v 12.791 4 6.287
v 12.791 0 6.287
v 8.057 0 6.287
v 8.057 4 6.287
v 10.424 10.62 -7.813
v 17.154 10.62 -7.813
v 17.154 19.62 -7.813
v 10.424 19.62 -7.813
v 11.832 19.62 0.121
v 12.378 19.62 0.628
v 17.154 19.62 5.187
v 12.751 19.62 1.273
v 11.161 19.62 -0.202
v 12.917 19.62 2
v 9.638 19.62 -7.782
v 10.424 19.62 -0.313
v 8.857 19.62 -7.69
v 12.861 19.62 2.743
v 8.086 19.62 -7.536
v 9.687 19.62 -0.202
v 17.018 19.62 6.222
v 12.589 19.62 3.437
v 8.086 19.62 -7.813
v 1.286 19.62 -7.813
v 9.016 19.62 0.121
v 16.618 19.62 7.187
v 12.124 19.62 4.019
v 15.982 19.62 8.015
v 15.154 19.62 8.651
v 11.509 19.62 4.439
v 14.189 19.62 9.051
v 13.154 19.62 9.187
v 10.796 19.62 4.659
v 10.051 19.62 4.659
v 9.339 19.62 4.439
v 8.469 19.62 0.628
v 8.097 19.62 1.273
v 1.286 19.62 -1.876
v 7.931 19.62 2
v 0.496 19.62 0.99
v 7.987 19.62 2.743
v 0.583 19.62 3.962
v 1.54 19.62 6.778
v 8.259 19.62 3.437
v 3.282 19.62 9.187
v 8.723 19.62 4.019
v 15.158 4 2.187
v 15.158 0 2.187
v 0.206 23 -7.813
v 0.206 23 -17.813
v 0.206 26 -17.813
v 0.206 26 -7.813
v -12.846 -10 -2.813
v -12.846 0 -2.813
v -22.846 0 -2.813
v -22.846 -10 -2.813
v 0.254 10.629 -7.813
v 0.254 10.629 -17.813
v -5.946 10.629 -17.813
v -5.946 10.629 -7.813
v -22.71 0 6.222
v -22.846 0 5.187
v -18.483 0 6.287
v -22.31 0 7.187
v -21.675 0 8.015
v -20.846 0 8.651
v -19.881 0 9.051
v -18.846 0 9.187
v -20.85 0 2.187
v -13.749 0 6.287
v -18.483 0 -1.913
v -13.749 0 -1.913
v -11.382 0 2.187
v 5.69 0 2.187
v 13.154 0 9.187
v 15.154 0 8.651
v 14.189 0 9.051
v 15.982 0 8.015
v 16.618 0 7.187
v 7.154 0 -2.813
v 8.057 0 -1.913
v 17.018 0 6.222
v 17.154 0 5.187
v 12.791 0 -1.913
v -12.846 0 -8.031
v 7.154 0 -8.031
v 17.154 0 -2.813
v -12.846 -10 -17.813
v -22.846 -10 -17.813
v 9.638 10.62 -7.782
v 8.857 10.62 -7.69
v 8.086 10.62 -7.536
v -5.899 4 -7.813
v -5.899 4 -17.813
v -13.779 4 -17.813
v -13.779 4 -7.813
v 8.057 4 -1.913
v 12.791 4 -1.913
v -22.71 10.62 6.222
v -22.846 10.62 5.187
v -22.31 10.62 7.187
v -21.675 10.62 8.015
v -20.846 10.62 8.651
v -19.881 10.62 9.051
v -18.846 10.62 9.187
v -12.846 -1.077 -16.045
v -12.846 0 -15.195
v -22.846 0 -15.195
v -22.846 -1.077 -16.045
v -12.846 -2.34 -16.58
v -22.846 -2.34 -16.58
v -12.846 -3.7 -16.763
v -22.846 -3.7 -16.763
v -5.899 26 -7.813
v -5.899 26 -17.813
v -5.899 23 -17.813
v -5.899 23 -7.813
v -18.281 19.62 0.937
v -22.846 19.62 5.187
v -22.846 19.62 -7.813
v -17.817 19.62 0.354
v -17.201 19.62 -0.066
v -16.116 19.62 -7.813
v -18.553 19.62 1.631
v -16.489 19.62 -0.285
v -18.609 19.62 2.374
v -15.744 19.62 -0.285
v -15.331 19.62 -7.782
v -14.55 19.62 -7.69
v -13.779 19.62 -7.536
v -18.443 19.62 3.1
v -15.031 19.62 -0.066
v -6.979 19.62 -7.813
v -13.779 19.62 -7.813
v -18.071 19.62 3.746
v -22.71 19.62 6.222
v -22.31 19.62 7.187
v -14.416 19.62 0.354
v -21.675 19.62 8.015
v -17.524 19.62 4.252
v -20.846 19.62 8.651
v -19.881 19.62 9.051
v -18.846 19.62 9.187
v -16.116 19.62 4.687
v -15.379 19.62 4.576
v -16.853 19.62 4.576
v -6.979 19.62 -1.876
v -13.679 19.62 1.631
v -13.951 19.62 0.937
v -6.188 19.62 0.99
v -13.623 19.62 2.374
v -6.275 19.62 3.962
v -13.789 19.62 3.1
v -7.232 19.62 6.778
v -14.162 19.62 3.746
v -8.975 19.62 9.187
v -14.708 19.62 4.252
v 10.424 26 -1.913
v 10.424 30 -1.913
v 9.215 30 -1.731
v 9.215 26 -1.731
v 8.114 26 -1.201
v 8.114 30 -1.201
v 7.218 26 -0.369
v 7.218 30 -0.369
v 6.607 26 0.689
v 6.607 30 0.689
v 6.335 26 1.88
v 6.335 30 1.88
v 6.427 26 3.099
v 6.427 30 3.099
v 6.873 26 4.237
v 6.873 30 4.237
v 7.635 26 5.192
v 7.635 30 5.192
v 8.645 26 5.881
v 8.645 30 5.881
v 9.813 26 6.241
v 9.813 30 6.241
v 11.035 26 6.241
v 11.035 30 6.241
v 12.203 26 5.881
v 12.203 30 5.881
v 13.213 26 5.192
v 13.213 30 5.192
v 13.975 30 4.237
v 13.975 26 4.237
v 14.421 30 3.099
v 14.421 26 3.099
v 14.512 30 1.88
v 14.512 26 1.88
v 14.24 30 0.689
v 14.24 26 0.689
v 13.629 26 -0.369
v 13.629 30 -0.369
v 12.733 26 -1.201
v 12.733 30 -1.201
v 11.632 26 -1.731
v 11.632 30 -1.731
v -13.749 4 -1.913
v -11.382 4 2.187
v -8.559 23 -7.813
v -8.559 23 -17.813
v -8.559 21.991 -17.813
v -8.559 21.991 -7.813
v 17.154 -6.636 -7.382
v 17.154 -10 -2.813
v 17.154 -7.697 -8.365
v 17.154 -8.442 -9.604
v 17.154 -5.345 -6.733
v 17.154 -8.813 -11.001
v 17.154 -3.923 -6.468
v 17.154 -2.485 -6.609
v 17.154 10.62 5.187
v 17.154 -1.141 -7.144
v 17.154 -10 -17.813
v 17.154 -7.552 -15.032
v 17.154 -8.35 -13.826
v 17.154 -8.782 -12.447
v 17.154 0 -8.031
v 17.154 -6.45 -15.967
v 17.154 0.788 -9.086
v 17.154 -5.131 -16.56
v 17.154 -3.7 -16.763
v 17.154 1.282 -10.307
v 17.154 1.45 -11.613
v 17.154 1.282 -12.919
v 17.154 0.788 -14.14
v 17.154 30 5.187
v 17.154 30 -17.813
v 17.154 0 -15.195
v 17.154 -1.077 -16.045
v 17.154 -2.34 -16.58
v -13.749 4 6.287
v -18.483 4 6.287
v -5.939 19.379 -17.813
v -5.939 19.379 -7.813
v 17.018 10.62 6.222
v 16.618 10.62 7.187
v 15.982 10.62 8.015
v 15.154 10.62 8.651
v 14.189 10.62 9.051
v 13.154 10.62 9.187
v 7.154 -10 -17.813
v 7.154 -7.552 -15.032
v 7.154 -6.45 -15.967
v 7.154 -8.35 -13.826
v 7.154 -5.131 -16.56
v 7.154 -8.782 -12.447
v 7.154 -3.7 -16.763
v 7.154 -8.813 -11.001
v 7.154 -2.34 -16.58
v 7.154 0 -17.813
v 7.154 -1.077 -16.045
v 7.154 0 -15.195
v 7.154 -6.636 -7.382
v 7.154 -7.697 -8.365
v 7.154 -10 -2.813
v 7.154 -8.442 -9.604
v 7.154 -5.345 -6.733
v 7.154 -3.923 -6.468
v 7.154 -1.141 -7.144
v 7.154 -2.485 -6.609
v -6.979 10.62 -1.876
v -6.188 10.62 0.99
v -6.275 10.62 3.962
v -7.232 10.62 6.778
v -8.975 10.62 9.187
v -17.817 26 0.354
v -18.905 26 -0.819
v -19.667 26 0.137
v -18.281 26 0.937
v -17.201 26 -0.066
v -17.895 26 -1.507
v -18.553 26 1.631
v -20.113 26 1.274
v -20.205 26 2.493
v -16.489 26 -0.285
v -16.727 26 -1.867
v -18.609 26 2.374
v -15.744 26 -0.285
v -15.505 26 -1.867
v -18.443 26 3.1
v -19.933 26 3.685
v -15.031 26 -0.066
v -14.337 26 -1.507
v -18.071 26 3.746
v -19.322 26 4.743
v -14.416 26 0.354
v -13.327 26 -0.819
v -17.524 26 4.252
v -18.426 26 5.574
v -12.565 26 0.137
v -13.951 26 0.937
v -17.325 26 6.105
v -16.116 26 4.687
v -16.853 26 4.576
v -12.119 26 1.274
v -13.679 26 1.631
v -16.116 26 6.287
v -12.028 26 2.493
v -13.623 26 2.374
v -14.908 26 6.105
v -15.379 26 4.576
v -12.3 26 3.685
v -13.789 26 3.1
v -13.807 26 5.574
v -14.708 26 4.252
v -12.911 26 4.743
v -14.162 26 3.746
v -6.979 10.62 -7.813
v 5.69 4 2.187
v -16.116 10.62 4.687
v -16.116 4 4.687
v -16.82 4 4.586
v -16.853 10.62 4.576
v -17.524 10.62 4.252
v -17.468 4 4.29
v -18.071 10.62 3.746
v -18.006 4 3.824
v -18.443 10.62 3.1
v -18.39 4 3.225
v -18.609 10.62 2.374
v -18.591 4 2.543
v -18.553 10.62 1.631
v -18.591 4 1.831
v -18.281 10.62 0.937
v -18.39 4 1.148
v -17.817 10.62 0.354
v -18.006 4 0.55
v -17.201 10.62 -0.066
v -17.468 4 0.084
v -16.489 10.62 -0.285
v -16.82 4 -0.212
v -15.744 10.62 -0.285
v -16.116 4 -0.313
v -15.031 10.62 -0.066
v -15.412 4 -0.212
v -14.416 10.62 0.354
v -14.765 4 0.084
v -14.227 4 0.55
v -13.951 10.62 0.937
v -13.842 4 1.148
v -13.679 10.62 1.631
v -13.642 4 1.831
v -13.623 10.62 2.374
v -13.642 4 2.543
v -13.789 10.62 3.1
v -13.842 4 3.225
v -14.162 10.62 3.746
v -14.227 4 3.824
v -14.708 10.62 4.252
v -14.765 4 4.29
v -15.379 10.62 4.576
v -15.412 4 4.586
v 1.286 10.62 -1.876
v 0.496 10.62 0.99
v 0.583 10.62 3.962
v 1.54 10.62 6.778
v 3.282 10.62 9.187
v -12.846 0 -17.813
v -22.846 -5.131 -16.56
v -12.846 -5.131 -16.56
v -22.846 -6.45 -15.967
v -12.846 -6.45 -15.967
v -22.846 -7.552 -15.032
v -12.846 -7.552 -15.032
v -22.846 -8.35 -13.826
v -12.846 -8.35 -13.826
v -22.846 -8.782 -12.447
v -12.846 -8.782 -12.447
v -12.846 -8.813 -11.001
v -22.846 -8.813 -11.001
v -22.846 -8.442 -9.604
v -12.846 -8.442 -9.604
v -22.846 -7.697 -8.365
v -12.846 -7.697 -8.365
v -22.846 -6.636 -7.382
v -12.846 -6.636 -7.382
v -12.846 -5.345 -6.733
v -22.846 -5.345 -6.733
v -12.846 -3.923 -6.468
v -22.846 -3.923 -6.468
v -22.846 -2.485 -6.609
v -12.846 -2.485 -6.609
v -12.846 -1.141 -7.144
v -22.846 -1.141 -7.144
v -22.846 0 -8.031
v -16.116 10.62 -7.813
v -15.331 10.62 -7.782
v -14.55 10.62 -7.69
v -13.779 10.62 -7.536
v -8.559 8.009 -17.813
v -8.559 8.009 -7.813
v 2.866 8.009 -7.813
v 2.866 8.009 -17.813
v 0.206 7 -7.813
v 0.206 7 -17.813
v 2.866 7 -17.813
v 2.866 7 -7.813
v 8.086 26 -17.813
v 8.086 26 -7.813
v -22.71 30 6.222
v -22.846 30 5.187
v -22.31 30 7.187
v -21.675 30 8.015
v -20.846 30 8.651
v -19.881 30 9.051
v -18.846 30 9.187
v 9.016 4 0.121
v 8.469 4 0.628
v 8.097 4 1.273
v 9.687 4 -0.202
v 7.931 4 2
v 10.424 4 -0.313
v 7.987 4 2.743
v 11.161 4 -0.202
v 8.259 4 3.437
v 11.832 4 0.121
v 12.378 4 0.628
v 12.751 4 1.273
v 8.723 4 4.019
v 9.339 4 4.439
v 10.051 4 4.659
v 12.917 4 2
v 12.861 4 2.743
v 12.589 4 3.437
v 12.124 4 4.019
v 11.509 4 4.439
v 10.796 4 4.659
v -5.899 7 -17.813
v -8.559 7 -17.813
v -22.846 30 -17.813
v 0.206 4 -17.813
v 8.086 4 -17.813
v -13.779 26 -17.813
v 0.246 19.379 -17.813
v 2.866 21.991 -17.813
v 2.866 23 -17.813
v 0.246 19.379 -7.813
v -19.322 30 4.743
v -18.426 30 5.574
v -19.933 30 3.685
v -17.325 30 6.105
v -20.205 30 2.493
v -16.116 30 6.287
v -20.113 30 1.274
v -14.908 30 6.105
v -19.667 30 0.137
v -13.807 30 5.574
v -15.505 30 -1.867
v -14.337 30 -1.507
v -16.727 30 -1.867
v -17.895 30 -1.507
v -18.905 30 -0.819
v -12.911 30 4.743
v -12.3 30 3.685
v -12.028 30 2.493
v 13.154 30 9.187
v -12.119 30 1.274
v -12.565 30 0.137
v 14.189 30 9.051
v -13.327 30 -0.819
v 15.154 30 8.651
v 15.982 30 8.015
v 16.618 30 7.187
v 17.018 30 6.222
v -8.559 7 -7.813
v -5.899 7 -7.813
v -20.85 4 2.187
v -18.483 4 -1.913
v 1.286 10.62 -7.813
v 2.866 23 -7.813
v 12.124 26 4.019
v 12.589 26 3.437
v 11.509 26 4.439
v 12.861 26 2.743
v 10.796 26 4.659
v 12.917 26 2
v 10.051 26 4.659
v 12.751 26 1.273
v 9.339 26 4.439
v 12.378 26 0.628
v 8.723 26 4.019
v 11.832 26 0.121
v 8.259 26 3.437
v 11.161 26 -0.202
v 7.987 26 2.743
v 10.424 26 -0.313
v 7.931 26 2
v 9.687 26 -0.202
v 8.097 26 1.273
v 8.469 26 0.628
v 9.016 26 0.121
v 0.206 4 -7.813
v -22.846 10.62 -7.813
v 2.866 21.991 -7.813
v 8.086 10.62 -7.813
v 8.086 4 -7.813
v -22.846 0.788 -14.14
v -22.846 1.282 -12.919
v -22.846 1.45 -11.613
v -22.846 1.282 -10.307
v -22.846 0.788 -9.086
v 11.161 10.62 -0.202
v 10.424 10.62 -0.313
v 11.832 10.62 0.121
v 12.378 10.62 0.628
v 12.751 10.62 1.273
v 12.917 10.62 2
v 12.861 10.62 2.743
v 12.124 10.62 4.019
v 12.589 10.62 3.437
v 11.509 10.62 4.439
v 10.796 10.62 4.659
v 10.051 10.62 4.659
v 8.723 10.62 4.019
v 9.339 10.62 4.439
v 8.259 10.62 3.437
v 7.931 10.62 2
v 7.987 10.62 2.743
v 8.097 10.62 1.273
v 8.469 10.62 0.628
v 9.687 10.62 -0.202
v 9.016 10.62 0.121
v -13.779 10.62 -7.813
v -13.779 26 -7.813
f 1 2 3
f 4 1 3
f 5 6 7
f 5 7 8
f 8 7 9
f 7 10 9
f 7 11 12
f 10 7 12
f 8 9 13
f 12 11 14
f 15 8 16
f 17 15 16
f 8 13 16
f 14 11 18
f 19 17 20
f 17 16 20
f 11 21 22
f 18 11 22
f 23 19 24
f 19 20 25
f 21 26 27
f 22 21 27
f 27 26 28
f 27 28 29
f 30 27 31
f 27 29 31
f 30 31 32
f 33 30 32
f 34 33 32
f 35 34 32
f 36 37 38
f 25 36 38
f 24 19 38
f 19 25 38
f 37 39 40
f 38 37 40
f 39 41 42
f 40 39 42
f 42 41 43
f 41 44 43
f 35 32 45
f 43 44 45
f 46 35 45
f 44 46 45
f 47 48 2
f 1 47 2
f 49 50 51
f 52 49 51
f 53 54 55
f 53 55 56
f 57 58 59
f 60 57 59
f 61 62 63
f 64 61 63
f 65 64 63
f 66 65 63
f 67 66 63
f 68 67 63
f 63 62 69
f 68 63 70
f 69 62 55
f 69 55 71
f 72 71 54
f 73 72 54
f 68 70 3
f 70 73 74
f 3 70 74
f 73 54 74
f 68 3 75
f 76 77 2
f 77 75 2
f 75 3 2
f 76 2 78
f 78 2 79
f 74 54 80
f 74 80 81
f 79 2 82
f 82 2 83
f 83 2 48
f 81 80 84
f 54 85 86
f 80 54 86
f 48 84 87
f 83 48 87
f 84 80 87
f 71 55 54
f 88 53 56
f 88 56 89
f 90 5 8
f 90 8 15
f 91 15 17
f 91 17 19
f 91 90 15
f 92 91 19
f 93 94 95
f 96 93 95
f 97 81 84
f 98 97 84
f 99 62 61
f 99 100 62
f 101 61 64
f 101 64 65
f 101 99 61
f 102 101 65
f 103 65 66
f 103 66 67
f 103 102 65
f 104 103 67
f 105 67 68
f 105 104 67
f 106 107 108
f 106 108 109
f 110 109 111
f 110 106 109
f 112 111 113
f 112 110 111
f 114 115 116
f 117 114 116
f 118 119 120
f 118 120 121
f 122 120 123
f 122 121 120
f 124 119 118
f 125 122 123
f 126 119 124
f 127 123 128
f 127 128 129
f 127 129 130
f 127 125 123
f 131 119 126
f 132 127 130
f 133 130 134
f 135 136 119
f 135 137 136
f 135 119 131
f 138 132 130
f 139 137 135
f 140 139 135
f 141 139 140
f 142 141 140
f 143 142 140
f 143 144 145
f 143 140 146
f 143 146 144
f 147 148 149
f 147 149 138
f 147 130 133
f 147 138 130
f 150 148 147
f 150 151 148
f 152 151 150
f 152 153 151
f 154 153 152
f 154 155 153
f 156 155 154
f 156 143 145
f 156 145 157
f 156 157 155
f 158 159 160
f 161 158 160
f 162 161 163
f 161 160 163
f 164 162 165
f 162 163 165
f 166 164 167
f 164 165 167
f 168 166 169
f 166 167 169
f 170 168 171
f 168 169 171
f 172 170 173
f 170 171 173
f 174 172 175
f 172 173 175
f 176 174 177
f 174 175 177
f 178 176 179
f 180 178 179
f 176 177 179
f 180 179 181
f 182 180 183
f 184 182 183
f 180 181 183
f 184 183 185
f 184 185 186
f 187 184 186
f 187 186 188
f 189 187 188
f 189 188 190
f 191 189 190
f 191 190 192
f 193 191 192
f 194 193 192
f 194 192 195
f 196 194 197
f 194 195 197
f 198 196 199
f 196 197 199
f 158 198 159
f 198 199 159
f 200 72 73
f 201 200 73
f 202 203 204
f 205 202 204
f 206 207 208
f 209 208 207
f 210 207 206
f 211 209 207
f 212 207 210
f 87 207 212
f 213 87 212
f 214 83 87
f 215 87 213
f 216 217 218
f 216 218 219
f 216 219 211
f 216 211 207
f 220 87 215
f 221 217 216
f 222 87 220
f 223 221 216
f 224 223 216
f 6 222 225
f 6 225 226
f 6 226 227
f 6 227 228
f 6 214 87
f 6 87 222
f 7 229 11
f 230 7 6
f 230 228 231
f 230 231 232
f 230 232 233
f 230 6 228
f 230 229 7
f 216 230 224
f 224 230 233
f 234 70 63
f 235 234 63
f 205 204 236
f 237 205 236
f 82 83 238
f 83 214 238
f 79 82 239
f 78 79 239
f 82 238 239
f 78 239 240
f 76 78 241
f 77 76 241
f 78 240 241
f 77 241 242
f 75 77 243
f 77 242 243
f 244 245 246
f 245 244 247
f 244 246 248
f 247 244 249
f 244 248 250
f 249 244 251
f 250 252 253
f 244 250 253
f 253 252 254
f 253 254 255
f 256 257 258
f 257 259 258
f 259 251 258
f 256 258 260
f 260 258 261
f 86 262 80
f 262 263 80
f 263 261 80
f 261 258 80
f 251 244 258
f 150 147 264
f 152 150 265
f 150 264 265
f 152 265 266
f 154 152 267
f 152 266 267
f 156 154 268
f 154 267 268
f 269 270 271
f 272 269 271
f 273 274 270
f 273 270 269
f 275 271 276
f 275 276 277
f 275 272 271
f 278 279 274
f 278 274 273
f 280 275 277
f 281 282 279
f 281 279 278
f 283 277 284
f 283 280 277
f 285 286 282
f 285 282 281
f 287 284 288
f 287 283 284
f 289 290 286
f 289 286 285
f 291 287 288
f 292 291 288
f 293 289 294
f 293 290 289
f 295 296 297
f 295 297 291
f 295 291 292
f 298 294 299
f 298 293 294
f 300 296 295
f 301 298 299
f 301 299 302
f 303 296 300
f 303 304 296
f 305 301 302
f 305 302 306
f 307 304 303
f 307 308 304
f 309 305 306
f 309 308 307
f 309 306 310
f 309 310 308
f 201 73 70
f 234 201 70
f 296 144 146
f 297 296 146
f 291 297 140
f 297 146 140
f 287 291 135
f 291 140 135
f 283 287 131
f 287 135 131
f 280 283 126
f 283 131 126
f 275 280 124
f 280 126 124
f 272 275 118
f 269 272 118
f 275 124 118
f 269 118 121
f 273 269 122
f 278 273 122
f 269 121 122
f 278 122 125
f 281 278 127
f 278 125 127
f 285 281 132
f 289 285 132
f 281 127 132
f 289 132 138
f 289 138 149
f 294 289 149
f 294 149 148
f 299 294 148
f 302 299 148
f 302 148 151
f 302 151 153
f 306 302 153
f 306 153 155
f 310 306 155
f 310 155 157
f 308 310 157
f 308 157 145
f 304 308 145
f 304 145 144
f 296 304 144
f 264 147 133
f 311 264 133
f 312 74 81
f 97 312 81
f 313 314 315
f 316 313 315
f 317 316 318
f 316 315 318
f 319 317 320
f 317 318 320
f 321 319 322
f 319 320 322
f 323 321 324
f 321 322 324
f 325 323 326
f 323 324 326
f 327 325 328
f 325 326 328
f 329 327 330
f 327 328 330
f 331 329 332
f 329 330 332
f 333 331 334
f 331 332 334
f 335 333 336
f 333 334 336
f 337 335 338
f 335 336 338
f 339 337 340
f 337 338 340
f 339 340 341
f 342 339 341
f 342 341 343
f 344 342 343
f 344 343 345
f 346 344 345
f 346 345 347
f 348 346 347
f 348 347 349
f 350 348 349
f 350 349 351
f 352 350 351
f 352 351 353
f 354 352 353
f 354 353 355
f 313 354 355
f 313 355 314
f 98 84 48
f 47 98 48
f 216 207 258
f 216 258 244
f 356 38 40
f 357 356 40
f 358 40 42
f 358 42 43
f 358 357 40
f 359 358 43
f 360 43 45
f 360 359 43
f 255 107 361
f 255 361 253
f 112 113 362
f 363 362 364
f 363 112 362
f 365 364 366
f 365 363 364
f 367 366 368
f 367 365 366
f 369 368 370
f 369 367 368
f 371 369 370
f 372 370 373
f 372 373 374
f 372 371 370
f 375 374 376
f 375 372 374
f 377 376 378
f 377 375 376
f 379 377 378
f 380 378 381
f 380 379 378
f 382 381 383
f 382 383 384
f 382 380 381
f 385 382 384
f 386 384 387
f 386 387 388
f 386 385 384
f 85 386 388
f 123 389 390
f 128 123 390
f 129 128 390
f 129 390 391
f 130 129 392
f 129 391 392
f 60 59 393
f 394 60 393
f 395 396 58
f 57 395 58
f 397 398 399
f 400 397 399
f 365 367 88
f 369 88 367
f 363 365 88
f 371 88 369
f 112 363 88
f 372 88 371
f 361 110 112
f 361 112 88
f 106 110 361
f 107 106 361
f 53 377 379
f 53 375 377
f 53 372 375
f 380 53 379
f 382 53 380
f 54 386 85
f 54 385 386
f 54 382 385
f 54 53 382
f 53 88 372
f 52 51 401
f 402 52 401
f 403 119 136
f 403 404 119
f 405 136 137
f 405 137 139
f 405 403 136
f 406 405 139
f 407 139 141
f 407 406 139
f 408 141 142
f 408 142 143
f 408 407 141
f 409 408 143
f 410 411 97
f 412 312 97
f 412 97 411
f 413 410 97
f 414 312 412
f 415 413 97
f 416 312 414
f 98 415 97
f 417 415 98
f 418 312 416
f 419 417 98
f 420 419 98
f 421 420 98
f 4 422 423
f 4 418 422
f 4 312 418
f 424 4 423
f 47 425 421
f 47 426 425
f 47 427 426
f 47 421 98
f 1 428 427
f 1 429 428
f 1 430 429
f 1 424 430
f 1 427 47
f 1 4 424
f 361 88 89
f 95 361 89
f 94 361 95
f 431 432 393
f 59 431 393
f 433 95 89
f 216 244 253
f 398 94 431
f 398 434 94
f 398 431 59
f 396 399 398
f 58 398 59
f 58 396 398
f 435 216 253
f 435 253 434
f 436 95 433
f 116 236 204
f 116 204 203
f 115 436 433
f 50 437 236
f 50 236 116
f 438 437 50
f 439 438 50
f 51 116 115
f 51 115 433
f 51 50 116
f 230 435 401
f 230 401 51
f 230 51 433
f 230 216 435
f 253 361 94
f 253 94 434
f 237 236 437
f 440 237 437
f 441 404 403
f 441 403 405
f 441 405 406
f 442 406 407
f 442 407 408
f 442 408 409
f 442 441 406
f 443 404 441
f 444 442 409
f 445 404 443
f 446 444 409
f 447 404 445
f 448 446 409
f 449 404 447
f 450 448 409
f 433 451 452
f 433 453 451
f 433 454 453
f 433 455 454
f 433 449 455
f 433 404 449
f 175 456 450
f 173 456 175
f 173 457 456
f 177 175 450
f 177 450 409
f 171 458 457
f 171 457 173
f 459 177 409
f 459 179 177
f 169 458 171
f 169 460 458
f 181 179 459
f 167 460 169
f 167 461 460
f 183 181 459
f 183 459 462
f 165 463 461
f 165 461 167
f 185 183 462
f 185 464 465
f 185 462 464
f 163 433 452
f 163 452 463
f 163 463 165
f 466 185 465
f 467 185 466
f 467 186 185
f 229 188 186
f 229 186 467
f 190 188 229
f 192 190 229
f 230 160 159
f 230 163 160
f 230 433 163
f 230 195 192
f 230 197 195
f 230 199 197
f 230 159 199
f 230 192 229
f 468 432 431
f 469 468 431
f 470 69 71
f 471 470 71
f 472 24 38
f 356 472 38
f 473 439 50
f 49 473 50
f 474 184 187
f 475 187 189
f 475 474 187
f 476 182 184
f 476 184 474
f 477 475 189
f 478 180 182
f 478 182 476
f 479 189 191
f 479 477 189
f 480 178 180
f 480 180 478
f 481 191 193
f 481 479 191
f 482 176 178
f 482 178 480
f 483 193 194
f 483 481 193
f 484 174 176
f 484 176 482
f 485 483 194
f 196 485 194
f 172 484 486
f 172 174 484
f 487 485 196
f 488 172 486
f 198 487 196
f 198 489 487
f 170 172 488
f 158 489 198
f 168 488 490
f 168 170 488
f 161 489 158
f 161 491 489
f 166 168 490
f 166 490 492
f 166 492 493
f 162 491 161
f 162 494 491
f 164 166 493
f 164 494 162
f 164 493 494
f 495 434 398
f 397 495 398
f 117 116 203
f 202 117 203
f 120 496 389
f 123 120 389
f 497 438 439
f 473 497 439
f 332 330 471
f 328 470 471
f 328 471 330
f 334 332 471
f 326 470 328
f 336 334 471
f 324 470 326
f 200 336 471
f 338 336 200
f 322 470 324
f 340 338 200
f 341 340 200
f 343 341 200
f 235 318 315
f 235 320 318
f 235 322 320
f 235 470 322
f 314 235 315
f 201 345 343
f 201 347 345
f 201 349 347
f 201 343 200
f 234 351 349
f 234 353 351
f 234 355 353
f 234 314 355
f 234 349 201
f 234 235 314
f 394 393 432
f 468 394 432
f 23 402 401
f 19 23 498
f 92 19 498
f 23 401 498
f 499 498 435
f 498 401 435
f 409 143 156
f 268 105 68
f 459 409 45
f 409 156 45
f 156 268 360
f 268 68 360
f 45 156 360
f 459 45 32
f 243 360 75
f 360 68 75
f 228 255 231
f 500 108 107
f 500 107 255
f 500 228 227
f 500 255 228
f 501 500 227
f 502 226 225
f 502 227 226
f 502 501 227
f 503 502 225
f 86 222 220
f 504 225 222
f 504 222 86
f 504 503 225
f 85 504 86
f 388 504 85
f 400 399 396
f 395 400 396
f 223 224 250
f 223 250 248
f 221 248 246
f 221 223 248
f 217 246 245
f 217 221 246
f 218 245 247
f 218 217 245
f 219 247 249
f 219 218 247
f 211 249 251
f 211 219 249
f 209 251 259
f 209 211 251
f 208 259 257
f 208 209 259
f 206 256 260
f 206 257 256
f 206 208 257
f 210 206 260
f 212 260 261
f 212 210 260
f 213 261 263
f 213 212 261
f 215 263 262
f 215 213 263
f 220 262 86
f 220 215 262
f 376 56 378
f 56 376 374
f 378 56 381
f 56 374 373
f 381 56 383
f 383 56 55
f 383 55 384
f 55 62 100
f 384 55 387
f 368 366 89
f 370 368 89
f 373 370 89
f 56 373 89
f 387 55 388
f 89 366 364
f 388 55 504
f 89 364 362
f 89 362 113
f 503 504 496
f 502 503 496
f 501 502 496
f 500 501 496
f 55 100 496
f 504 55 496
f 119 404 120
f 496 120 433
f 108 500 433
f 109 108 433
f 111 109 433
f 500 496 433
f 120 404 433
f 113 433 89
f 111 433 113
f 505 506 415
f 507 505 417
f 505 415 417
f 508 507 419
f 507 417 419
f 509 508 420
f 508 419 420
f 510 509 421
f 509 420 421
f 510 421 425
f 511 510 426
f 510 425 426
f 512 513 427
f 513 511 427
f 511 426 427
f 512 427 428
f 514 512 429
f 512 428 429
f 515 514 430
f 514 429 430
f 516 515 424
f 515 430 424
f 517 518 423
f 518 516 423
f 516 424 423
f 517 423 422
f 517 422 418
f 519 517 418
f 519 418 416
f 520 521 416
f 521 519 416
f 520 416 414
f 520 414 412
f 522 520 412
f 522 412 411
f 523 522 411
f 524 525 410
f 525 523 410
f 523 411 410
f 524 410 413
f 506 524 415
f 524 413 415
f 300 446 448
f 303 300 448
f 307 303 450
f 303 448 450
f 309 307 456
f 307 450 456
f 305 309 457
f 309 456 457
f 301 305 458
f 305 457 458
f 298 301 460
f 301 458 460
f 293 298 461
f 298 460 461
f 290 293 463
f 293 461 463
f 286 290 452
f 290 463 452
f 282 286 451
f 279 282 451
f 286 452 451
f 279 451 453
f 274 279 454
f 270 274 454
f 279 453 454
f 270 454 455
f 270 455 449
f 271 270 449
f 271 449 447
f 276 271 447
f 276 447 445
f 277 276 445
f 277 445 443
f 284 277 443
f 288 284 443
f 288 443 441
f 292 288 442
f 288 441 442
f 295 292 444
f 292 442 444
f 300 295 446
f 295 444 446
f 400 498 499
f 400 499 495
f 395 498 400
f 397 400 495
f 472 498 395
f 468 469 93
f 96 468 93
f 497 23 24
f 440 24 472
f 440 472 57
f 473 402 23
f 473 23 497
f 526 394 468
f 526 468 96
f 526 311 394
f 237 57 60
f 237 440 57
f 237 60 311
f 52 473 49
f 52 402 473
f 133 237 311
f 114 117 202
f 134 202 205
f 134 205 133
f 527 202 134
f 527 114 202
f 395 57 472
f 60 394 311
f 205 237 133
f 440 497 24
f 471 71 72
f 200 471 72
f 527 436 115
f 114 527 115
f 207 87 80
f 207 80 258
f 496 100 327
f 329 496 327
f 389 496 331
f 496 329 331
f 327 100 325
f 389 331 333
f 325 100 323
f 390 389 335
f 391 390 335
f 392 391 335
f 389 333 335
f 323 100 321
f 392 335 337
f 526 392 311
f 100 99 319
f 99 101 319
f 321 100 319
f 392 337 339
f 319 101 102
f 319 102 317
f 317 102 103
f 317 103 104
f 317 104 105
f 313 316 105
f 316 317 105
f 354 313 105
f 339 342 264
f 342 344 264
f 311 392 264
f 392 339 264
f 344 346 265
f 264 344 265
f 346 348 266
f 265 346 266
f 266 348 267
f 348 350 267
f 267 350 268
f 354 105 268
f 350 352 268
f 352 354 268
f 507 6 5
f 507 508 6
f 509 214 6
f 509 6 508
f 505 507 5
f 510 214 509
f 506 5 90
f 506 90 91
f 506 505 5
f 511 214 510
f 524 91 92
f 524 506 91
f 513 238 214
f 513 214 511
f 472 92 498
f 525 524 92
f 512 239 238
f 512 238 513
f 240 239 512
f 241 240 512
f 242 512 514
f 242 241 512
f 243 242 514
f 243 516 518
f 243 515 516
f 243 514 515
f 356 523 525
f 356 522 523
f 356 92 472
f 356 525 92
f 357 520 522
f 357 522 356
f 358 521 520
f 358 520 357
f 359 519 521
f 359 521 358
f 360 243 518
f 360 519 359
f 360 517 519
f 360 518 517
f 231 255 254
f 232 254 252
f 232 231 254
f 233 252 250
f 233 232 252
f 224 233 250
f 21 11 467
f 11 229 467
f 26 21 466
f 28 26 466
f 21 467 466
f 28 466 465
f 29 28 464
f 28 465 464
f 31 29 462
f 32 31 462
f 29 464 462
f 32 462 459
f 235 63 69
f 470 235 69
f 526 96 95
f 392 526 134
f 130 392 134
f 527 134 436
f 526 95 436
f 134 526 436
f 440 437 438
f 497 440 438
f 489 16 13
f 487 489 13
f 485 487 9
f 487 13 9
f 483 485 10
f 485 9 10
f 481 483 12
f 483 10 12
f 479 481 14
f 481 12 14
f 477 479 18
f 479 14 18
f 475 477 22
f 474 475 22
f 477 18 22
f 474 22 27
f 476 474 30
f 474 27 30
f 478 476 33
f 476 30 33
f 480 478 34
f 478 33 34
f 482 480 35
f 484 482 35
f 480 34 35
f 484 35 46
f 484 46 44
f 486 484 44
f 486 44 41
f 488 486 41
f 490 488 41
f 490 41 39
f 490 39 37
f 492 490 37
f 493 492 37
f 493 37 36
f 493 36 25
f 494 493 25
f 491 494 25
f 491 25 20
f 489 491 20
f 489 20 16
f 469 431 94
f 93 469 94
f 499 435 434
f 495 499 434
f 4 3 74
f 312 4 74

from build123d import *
from build123d.topology import SkipClean

# Parameters (mm, degrees)
SKETCH1_W                = 40
SKETCH1_H                = 27
BOSS_EXTRUDE1_DEPTH      = 30
CUT_EXTRUDE1_DEPTH       = 10
SKETCH3_R                = 2.5
CUT_EXTRUDE2_DEPTH       = 30
CUT_EXTRUDE5_START       = -10.62
CUT_EXTRUDE5_DEPTH       = 9
SKETCH10_W               = 20
SKETCH10_H               = 9
CUT_EXTRUDE7_DEPTH       = 6.8
SKETCH12_W               = 20
SKETCH12_H               = 9
CUT_EXTRUDE10_DEPTH      = 6.8
FILLET1_R                = 4
BOSS_EXTRUDE2_DEPTH      = 40
CUT_EXTRUDE14_DEPTH      = 54.078334793
CUT_EXTRUDE14_DEPTH_BACK = 54.078334793
SKETCH17_R               = 5.15
CUT_EXTRUDE11_REACH      = 42.583
SKETCH14_W               = 20
SKETCH14_H               = 10
SKETCH15_R               = 4.1
CUT_EXTRUDE12_DEPTH      = 4
SKETCH16_R               = 2.5
CUT_EXTRUDE13_DEPTH      = 4


with BuildPart() as part:
    # Sketch1 → Boss-Extrude1 (new body)
    with BuildSketch(Plane(origin=(0, 0, 0), x_dir=(1, 0, 0), z_dir=(0, 1, 0))):
        with Locations((-2.846153846, 4.313186813)):
            Rectangle(SKETCH1_W, SKETCH1_H)
    extrude(amount=BOSS_EXTRUDE1_DEPTH)

    # Sketch2 → Cut-Extrude1 (cut)
    with BuildSketch(Plane(origin=(0, 0, -17.813186813), x_dir=(-1, 0, 0), z_dir=(0, 0, -1))):
        Polygon((-8.086431081, 26), (-8.086431081, 4), (-0.206431081, 4), (-0.206431081, 7), (-2.866431081, 7), (-2.866431081, 8.008707537), (-0.253846154, 10.628707537), (5.946153846, 10.628707537), (8.558738773, 8.008707537), (8.558738773, 7), (5.898738773, 7), (5.898738773, 4), (13.778738773, 4), (13.778738773, 26), (5.898738773, 26), (5.898738773, 23), (8.558738773, 23), (8.558738773, 21.991292463), (5.938738773, 19.378707537), (-0.246431081, 19.378707537), (-2.866431081, 21.991292463), (-2.866431081, 23), (-0.206431081, 23), (-0.206431081, 26), align=None)
    extrude(amount=-CUT_EXTRUDE1_DEPTH, mode=Mode.SUBTRACT)

    # Sketch3 → Cut-Extrude2 (cut)
    with BuildSketch(Plane.XZ):
        with Locations(Location((10.423846154, 2.186813187, 0), (0, 0, 270))):
            Circle(SKETCH3_R)
        with Locations(Location((-16.116153846, 2.186813187, 0), (0, 0, 90))):
            Circle(SKETCH3_R)
    extrude(amount=-CUT_EXTRUDE2_DEPTH, mode=Mode.SUBTRACT)

    # Sketch8 → Cut-Extrude5 (cut)
    with BuildSketch(Plane.XZ.offset(CUT_EXTRUDE5_START)):
        with BuildLine():
            Line((3.282417725, 9.186813187), (17.153846154, 9.186813187))
            Line((17.153846154, 9.186813187), (17.153846154, -7.813186813))
            Line((17.153846154, -7.813186813), (10.423846154, -7.813186813))
            ThreePointArc((10.423846154, -7.813186813), (1.204301697, -1.686170159), (3.282417725, 9.186813187))
        make_face()
        with BuildLine():
            Line((-22.846153846, -7.813186813), (-16.116153846, -7.813186813))
            ThreePointArc((-16.116153846, -7.813186813), (-6.896609389, -1.686170159), (-8.974725418, 9.186813187))
            Line((-8.974725418, 9.186813187), (-22.846153846, 9.186813187))
            Line((-22.846153846, 9.186813187), (-22.846153846, -7.813186813))
        make_face()
    extrude(amount=-CUT_EXTRUDE5_DEPTH, mode=Mode.SUBTRACT)

    # Sketch10 → Cut-Extrude7 (cut)
    with BuildSketch(Plane.ZY.offset(-8.086431081)):
        with Locations((-7.813186813, 15.12)):
            Rectangle(SKETCH10_W, SKETCH10_H)
    extrude(amount=CUT_EXTRUDE7_DEPTH, mode=Mode.SUBTRACT)

    # Sketch12 → Cut-Extrude10 (cut)
    with BuildSketch(Plane(origin=(-13.778738773, 0, 0), x_dir=(0, 0, -1), z_dir=(1, 0, 0))):
        with Locations((7.813186813, 15.12)):
            Rectangle(SKETCH12_W, SKETCH12_H)
    extrude(amount=CUT_EXTRUDE10_DEPTH, mode=Mode.SUBTRACT)

    # Fillet1
    fillet1_edges = [part.edges().sort_by_distance(p)[0] for p in [
        (17.153846154, 24.81, 9.186813187),
        (-22.846153846, 24.81, 9.186813187),
        (17.153846154, 5.31, 9.186813187),
        (-22.846153846, 5.31, 9.186813187),
    ]]
    fillet(fillet1_edges, radius=FILLET1_R)

    # Sketch13 → Boss-Extrude2 (add)
    with BuildSketch(Plane(origin=(17.153846154, 0, 0), x_dir=(0, 0, -1), z_dir=(1, 0, 0))):
        with BuildLine():
            Line((17.813186813, -10), (17.813186813, 0))
            Line((17.813186813, 0), (15.195434711, 0))
            ThreePointArc((15.195434711, 0), (16.355078665, -1.690780832), (16.763186813, -3.7))
            ThreePointArc((16.763186813, -3.7), (9.603967646, -8.441891852), (8.030938916, 0))
            Line((8.030938916, 0), (2.813186813, 0))
            Line((2.813186813, 0), (2.813186813, -10))
            Line((2.813186813, -10), (17.813186813, -10))
        make_face()
    extrude(amount=-BOSS_EXTRUDE2_DEPTH)

    # Sketch17 → Cut-Extrude14 (cut, two sides: drawn at the far end of the back side and taken through both)
    with SkipClean():  # the faces are left unmerged after this step: merging them gives an invalid solid
        with BuildSketch(Plane(origin=(17.153846154, 0, 0), x_dir=(0, 0, -1), z_dir=(1, 0, 0)).offset(-CUT_EXTRUDE14_DEPTH_BACK)):
            with Locations((11.613186813, -3.7)):
                Circle(SKETCH17_R)
        extrude(amount=CUT_EXTRUDE14_DEPTH + CUT_EXTRUDE14_DEPTH_BACK, mode=Mode.SUBTRACT)

    # Sketch14 → Cut-Extrude11 (cut, up to next)
    with BuildSketch(Plane.XY.offset(-2.813186813), mode=Mode.PRIVATE) as cut_extrude11_sk1:
        with Locations((-2.846153846, -5)):
            Rectangle(SKETCH14_W, SKETCH14_H)
    cut_extrude11_tool1 = extrude(cut_extrude11_sk1.sketch, amount=-CUT_EXTRUDE11_REACH, mode=Mode.PRIVATE) & part.part
    add(cut_extrude11_tool1.solids().sort_by_distance((-2.846154, -5, -2.813187))[0], mode=Mode.SUBTRACT)

    # Sketch15 → Cut-Extrude12 (cut)
    with SkipClean():  # the faces are left unmerged after this step: merging them gives an invalid solid
        with BuildSketch(Plane(origin=(0, 30, 0), x_dir=(1, 0, 0), z_dir=(0, 1, 0))):
            with Locations(Location((-16.116153846, -2.186813187, 0), (0, 0, 270))):
                Circle(SKETCH15_R)
            with Locations(Location((10.423846154, -2.186813187, 0), (0, 0, 90))):
                Circle(SKETCH15_R)
        extrude(amount=-CUT_EXTRUDE12_DEPTH, mode=Mode.SUBTRACT)

    # Sketch16 → Cut-Extrude13 (cut)
    # profile 1 of 2: a face of its own
    with SkipClean():  # the faces are left unmerged after this step: merging them gives an invalid solid
        with BuildSketch(Plane.XZ):
            Polygon((-13.749017742, -1.913186813), (-11.381881639, 2.186813187), (-13.749017742, 6.286813187), (-18.48328995, 6.286813187), (-20.850426054, 2.186813187), (-18.48328995, -1.913186813), align=None)
            with Locations(Location((-16.116153846, 2.186813187, 0), (0, 0, 270))):
                Circle(SKETCH16_R, mode=Mode.SUBTRACT)
        # profile 2 of 2: a face of its own
        with BuildSketch(Plane.XZ):
            Polygon((12.790982258, -1.913186813), (15.158118361, 2.186813187), (12.790982258, 6.286813187), (8.05671005, 6.286813187), (5.689573946, 2.186813187), (8.05671005, -1.913186813), align=None)
            with Locations(Location((10.423846154, 2.186813187, 0), (0, 0, 270))):
                Circle(SKETCH16_R, mode=Mode.SUBTRACT)
        extrude(amount=-CUT_EXTRUDE13_DEPTH, mode=Mode.SUBTRACT)


solid = part.part
